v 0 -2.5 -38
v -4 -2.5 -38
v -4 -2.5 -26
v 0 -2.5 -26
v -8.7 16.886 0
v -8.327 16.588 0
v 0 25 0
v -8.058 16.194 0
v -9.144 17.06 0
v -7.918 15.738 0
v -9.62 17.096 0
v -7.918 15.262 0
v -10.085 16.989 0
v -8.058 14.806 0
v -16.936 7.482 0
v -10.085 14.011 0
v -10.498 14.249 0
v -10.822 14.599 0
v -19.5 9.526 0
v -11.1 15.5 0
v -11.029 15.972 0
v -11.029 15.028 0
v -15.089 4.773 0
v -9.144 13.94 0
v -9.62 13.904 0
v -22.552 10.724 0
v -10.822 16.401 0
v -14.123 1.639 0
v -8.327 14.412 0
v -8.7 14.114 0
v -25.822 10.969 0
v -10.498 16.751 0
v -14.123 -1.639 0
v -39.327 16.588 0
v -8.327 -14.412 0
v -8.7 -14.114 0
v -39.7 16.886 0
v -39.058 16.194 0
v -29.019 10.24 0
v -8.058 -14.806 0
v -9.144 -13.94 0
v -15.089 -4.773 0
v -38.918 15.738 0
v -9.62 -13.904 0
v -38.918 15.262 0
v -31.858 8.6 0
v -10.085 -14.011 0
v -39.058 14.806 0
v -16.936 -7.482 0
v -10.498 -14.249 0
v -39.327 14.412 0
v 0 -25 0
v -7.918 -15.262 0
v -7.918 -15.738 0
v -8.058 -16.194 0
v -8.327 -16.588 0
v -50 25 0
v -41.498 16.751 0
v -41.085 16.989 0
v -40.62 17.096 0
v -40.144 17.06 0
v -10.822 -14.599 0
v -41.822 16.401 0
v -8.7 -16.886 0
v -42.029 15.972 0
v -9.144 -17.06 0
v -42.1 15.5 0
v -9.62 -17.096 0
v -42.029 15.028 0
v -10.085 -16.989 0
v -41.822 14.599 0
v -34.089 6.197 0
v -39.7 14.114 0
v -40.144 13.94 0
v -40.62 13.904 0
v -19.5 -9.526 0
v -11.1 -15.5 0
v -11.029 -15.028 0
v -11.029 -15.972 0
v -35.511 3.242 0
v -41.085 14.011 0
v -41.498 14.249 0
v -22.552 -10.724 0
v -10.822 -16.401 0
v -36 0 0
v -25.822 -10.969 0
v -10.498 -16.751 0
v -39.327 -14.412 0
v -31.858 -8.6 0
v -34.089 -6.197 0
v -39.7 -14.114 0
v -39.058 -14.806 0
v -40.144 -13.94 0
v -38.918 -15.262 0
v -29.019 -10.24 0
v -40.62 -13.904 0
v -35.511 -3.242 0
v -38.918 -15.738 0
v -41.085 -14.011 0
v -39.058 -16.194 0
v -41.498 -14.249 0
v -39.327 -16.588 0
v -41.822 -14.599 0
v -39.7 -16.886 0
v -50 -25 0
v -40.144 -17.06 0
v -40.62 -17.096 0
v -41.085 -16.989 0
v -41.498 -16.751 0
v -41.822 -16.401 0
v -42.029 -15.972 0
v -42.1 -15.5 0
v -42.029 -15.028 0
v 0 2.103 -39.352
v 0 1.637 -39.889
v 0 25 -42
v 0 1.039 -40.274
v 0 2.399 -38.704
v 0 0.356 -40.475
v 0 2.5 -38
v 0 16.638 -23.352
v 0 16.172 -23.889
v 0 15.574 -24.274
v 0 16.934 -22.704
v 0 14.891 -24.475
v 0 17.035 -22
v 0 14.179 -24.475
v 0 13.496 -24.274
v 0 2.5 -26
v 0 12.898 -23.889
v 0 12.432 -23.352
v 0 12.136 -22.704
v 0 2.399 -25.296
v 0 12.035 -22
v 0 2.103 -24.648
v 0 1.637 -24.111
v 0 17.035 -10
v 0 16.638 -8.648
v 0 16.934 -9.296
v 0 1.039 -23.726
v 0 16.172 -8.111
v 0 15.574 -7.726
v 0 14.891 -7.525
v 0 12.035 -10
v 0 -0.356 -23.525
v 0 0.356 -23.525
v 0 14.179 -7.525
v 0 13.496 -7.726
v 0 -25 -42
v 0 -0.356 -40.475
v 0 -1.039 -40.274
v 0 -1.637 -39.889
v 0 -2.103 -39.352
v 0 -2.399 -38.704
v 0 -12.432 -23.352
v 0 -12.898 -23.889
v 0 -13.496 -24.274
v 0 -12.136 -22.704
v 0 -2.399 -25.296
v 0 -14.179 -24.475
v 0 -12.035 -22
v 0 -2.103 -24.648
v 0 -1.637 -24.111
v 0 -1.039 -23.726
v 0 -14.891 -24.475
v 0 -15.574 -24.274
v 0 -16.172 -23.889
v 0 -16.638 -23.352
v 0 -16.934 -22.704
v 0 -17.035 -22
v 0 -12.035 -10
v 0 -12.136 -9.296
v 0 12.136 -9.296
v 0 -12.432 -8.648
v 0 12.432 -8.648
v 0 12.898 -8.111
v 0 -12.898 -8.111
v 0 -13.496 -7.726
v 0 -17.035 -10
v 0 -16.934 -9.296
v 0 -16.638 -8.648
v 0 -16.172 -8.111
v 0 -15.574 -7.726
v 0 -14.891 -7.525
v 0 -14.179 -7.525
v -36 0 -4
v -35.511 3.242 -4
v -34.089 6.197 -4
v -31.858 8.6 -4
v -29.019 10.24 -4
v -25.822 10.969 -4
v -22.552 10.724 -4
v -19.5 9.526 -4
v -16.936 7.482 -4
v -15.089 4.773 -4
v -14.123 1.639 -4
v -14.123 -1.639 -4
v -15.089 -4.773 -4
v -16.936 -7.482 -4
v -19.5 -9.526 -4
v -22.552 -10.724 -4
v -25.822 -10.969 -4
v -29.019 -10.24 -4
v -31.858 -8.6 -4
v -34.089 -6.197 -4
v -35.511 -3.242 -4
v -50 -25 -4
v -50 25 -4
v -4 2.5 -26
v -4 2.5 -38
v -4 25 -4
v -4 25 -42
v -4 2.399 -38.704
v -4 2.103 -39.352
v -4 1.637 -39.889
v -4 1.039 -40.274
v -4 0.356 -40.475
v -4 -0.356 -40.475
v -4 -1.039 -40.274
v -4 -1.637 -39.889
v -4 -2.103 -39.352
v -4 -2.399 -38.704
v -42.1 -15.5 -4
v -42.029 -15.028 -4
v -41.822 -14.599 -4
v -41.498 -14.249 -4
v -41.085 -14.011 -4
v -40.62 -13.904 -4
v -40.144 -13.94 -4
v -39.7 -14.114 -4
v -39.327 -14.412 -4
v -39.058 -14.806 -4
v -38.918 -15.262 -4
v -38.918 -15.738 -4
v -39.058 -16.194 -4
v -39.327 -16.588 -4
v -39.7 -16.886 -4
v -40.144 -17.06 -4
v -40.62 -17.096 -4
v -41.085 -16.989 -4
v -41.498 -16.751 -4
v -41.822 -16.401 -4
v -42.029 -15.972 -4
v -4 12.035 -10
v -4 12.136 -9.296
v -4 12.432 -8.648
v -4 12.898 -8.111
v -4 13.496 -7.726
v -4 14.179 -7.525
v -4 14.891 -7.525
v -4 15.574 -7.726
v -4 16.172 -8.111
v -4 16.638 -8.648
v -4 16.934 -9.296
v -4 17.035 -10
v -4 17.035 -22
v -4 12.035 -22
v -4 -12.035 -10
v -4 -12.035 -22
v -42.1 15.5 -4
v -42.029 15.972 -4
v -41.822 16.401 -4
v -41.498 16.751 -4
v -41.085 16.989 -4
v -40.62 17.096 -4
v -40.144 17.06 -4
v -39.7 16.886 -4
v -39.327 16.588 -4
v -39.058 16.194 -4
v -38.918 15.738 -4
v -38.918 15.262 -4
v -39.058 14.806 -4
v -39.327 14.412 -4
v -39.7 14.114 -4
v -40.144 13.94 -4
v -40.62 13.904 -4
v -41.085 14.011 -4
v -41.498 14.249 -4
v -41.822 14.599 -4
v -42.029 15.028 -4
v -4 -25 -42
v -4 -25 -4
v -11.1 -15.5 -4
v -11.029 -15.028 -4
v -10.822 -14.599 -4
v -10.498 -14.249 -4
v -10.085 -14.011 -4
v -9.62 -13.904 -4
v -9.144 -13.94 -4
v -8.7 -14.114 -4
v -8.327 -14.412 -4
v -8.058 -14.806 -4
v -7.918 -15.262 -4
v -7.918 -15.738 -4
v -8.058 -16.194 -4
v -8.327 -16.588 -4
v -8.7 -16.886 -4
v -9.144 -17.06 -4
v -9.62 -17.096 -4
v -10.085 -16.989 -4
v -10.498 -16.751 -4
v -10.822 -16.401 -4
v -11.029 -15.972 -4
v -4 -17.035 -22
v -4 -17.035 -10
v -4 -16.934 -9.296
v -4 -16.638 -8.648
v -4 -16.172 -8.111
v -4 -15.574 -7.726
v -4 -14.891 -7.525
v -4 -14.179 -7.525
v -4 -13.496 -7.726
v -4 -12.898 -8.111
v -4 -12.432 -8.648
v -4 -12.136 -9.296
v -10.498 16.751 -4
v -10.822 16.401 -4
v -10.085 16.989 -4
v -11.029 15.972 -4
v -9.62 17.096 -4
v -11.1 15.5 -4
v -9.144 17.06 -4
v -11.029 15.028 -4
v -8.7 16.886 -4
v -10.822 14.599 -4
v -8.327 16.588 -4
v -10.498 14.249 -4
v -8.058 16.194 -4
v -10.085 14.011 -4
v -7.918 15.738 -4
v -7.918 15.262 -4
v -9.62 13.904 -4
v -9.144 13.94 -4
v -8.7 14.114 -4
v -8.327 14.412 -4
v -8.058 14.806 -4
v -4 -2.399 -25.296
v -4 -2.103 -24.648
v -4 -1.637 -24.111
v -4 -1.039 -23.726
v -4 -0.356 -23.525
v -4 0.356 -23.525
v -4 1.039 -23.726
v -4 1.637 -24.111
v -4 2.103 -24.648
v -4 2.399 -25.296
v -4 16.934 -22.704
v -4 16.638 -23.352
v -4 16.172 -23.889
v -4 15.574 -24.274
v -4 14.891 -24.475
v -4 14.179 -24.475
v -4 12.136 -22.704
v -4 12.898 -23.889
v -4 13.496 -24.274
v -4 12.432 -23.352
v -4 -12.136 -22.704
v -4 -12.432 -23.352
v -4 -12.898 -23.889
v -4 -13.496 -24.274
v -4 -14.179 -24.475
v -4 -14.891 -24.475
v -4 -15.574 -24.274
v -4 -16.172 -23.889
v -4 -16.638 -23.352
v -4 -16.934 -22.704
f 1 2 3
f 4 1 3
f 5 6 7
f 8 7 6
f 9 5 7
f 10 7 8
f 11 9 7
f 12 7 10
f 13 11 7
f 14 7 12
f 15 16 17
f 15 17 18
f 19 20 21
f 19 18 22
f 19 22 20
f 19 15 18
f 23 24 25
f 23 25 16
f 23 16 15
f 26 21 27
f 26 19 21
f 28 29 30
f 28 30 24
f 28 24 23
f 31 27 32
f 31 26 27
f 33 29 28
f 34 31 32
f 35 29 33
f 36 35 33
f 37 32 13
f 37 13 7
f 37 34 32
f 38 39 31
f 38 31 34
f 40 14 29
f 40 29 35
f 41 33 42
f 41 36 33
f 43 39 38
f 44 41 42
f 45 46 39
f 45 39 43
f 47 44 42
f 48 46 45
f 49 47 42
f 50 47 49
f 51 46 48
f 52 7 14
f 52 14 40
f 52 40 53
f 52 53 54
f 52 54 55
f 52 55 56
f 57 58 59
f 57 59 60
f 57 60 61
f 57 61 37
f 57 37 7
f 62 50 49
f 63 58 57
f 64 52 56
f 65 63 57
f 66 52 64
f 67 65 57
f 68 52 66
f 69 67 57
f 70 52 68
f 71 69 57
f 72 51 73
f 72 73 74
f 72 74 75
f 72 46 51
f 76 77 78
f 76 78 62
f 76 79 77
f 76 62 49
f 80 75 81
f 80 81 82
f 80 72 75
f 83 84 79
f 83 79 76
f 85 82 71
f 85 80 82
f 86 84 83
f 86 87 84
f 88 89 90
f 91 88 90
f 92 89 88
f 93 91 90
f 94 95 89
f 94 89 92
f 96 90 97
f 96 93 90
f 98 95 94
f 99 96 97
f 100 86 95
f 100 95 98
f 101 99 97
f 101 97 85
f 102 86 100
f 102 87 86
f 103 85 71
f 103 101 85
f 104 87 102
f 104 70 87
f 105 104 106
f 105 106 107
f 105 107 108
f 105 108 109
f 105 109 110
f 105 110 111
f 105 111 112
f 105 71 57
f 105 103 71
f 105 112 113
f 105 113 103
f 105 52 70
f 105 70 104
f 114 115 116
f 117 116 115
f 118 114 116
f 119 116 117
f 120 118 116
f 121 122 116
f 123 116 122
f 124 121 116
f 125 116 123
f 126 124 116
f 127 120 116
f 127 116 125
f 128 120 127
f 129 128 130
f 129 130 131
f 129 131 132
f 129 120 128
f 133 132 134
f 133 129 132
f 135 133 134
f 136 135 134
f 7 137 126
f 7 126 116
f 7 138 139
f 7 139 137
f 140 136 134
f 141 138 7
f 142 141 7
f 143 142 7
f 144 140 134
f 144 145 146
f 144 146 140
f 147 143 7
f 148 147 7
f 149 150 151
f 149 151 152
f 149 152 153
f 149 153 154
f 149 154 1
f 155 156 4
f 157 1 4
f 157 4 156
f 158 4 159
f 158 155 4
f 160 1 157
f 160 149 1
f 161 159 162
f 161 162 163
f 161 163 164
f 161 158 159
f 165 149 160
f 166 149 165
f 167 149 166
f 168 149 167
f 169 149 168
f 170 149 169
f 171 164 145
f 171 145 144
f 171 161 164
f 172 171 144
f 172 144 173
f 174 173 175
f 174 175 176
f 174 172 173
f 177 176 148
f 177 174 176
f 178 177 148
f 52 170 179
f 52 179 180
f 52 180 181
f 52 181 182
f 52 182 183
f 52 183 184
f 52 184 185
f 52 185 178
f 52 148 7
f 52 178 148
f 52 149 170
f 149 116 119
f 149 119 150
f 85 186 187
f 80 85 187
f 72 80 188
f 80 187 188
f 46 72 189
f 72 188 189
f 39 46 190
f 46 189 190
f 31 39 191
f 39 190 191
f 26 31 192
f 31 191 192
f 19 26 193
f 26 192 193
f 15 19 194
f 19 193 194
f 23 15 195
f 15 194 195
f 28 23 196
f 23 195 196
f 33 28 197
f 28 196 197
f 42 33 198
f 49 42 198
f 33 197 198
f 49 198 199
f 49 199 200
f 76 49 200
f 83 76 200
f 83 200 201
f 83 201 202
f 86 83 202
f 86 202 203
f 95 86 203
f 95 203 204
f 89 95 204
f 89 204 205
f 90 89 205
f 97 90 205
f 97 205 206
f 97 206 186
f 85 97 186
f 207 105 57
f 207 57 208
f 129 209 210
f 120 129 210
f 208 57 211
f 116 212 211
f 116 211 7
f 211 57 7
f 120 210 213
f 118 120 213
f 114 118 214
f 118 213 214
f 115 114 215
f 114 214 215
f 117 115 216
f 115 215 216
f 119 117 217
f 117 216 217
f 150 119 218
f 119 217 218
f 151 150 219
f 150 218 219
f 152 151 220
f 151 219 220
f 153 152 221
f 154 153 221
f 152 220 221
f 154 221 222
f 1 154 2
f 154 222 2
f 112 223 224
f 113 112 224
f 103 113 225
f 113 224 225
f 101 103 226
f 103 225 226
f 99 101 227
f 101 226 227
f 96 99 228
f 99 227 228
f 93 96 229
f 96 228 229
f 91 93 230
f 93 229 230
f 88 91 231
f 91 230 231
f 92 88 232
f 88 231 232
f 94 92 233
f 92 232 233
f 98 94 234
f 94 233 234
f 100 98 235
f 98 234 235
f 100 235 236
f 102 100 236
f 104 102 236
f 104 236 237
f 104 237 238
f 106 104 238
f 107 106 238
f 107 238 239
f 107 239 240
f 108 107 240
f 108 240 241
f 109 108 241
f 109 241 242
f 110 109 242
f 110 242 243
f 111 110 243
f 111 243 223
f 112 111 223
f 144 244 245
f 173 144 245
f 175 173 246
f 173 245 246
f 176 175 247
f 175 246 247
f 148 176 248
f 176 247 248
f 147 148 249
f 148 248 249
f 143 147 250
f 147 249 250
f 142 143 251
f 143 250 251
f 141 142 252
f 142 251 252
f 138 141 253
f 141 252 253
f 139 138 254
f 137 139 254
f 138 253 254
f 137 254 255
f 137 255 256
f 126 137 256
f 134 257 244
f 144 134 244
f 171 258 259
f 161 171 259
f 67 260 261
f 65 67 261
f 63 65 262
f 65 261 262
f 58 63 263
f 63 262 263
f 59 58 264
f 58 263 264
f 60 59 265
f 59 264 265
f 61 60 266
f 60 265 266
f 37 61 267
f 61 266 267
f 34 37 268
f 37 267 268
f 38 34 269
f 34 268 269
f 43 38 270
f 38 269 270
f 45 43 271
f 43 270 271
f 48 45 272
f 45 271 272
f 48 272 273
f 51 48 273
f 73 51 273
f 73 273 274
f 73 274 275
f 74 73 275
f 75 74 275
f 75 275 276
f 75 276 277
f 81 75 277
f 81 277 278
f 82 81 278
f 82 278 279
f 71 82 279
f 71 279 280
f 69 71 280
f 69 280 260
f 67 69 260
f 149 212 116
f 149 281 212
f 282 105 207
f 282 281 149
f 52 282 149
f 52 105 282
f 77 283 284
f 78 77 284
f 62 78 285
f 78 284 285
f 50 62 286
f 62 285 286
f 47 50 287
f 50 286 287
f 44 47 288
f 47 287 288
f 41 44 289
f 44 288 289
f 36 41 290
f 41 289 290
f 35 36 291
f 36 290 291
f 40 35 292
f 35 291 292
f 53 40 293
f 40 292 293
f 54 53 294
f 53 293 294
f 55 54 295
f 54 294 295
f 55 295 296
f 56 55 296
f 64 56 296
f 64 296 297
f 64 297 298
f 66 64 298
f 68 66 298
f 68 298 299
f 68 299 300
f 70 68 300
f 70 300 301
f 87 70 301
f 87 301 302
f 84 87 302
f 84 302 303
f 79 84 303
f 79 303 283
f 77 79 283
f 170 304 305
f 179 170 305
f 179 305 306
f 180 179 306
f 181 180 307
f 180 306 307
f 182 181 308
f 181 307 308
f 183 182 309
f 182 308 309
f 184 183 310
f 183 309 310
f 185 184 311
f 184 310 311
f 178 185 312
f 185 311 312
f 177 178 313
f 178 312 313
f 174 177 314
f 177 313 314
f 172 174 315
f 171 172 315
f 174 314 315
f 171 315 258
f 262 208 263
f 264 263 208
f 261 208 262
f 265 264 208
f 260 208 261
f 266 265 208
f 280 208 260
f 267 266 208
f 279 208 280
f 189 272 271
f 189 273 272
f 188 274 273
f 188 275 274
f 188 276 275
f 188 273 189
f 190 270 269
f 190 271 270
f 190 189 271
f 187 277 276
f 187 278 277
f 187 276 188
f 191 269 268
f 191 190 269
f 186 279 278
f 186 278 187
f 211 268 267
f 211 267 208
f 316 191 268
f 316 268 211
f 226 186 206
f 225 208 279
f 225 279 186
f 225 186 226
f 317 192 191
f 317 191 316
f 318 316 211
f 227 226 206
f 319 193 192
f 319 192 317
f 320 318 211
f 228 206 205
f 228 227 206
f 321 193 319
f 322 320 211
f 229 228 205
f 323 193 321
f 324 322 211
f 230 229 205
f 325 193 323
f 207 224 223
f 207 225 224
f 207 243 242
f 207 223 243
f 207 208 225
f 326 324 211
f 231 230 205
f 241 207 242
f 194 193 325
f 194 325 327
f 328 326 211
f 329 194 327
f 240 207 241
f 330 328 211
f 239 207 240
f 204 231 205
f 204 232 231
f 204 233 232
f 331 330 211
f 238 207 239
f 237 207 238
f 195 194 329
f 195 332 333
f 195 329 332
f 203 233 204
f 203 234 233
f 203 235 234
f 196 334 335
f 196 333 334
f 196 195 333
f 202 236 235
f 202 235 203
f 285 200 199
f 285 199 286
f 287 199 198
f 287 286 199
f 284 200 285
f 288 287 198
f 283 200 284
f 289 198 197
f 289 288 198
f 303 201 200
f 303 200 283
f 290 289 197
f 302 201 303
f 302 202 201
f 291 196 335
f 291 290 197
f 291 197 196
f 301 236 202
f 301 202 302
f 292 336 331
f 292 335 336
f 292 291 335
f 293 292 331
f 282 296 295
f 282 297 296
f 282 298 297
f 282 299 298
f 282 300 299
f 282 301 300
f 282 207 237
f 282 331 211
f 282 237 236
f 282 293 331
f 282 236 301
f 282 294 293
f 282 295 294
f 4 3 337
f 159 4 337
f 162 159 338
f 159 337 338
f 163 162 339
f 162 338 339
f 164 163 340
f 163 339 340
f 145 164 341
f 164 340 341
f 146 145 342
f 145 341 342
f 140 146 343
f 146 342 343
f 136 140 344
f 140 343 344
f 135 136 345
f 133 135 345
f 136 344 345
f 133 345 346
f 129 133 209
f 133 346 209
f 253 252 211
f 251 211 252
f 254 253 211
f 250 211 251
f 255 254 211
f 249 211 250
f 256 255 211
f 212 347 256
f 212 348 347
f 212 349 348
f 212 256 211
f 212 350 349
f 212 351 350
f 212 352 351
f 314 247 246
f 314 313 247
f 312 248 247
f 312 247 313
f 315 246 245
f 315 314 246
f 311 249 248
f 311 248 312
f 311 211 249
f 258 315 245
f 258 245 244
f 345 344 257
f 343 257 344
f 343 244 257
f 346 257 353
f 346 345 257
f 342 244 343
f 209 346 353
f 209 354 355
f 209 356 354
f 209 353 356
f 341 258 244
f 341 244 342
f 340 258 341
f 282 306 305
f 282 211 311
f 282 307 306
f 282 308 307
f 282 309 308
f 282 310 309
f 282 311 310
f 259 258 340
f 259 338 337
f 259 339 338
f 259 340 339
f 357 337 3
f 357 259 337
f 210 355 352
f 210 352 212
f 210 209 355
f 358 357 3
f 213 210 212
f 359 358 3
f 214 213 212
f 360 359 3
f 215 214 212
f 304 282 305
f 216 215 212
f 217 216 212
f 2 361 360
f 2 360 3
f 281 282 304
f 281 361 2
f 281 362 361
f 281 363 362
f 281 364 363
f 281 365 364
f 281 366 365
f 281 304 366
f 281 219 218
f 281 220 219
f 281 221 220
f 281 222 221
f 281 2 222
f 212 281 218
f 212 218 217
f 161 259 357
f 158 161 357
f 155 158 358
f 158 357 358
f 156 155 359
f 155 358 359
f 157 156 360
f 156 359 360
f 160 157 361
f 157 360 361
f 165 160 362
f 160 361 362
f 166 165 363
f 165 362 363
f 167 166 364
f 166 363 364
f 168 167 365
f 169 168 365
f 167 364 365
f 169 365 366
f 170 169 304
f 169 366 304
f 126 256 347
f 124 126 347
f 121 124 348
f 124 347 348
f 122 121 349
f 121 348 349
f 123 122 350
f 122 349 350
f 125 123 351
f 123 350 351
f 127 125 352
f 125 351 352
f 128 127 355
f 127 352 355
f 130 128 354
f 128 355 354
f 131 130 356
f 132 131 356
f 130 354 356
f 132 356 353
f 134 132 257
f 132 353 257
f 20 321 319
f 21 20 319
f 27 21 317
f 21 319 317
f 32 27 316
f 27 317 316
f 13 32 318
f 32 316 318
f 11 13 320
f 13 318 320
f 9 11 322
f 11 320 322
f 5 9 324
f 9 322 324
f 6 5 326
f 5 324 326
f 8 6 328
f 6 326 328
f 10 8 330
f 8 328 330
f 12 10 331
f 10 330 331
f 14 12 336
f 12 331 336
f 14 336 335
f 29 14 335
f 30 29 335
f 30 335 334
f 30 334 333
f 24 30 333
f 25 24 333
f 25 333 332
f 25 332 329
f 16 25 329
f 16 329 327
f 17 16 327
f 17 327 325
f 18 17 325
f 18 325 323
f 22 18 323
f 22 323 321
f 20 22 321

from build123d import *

# Parameters (mm, degrees)
F1_DEPTH = 25
F3_D     = 3.2
F4_D     = 22
F6_DEPTH = 4.001


with BuildPart() as f1:
    # F0 (on Front) → F1 (new body, symmetric)
    with BuildSketch(Plane.XZ):
        Polygon((0, -42), (0, 0), (-50, 0), (-50, -4), (-4, -4), (-4, -42), align=None)
    extrude(amount=F1_DEPTH, both=True)

    # F3 (through all)
    with Locations(Plane.XY):
        with Locations((-9.5, 15.5), (-9.5, -15.5), (-40.5, -15.5), (-40.5, 15.5)):
            Hole(F3_D / 2)

    # F4 (through all)
    with Locations(Plane.XY):
        with Locations((-25, 0)):
            Hole(F4_D / 2)

    # F5 (on face) → F6 (cut, through all)
    with BuildSketch(Plane(origin=(-4, 0, 0), x_dir=(0, -1, 0), z_dir=(-1, 0, 0))):
        with BuildLine():
            ThreePointArc((-17.034974, -22), (-14.534974, -24.5), (-12.034974, -22))
            Line((-12.034974, -22), (-12.034974, -10))
            ThreePointArc((-12.034974, -10), (-14.534974, -7.5), (-17.034974, -10))
            Line((-17.034974, -10), (-17.034974, -22))
        make_face()
        with BuildLine():
            ThreePointArc((-2.5, -38), (0, -40.5), (2.5, -38))
            Line((2.5, -38), (2.5, -26))
            ThreePointArc((2.5, -26), (0, -23.5), (-2.5, -26))
            Line((-2.5, -26), (-2.5, -38))
        make_face()
        with BuildLine():
            ThreePointArc((12.034974, -22), (14.534974, -24.5), (17.034974, -22))
            Line((17.034974, -22), (17.034974, -10))
            ThreePointArc((17.034974, -10), (14.534974, -7.5), (12.034974, -10))
            Line((12.034974, -10), (12.034974, -22))
        make_face()
    extrude(amount=-F6_DEPTH, mode=Mode.SUBTRACT)


solid = f1.part
